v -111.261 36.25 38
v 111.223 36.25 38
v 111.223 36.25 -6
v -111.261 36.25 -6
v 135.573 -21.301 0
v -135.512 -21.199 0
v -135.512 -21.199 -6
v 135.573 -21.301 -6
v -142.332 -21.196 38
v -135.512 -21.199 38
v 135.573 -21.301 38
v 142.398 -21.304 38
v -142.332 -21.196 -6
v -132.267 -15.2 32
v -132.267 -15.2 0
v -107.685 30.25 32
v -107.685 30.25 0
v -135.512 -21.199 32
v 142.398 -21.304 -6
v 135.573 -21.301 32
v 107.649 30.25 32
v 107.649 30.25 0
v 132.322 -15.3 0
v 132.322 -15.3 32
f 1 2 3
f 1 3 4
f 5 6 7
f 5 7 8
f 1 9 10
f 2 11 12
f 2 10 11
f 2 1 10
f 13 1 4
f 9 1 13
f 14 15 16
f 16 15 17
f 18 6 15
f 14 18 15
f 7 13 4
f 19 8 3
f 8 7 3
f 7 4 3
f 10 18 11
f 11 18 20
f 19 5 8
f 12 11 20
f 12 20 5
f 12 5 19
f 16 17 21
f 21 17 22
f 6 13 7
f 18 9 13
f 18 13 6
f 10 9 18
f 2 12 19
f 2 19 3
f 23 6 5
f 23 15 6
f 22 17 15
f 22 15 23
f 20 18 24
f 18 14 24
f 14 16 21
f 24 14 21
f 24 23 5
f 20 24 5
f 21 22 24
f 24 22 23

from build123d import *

# Parameters (mm, degrees)
BOSS_EXTRUDE3_DEPTH = 38
BOSS_EXTRUDE4_DEPTH = 6


with BuildPart() as part:
    # Sketch1 → Boss-Extrude3 (new body)
    with BuildSketch(Plane.XY):
        Polygon((-107.68463, 30.25), (107.648903001, 30.25), (132.321905897, -15.300159192), (135.572573725, -21.301392104), (142.39764743, -21.30397981), (111.222575033, 36.25), (-111.260793608, 36.25), (-142.331864382, -21.196025493), (-135.511854399, -21.198611279), (-132.267274575, -15.19984102), align=None)
    extrude(amount=BOSS_EXTRUDE3_DEPTH)

    # Sketch1<3> → Boss-Extrude4 (add)
    with BuildSketch(Plane.XY):
        Polygon((142.39764743, -21.30397981), (111.222575033, 36.25), (-111.260793608, 36.25), (-142.331864382, -21.196025493), align=None)
    boss_extrude4 = extrude(amount=-BOSS_EXTRUDE4_DEPTH)

    # Mirror1: Boss-Extrude4 across plane
    add(boss_extrude4.mirror(Plane(origin=(0, 0, 16), x_dir=(1, 0, 0), z_dir=(0, 0, -1))))


solid = part.part
